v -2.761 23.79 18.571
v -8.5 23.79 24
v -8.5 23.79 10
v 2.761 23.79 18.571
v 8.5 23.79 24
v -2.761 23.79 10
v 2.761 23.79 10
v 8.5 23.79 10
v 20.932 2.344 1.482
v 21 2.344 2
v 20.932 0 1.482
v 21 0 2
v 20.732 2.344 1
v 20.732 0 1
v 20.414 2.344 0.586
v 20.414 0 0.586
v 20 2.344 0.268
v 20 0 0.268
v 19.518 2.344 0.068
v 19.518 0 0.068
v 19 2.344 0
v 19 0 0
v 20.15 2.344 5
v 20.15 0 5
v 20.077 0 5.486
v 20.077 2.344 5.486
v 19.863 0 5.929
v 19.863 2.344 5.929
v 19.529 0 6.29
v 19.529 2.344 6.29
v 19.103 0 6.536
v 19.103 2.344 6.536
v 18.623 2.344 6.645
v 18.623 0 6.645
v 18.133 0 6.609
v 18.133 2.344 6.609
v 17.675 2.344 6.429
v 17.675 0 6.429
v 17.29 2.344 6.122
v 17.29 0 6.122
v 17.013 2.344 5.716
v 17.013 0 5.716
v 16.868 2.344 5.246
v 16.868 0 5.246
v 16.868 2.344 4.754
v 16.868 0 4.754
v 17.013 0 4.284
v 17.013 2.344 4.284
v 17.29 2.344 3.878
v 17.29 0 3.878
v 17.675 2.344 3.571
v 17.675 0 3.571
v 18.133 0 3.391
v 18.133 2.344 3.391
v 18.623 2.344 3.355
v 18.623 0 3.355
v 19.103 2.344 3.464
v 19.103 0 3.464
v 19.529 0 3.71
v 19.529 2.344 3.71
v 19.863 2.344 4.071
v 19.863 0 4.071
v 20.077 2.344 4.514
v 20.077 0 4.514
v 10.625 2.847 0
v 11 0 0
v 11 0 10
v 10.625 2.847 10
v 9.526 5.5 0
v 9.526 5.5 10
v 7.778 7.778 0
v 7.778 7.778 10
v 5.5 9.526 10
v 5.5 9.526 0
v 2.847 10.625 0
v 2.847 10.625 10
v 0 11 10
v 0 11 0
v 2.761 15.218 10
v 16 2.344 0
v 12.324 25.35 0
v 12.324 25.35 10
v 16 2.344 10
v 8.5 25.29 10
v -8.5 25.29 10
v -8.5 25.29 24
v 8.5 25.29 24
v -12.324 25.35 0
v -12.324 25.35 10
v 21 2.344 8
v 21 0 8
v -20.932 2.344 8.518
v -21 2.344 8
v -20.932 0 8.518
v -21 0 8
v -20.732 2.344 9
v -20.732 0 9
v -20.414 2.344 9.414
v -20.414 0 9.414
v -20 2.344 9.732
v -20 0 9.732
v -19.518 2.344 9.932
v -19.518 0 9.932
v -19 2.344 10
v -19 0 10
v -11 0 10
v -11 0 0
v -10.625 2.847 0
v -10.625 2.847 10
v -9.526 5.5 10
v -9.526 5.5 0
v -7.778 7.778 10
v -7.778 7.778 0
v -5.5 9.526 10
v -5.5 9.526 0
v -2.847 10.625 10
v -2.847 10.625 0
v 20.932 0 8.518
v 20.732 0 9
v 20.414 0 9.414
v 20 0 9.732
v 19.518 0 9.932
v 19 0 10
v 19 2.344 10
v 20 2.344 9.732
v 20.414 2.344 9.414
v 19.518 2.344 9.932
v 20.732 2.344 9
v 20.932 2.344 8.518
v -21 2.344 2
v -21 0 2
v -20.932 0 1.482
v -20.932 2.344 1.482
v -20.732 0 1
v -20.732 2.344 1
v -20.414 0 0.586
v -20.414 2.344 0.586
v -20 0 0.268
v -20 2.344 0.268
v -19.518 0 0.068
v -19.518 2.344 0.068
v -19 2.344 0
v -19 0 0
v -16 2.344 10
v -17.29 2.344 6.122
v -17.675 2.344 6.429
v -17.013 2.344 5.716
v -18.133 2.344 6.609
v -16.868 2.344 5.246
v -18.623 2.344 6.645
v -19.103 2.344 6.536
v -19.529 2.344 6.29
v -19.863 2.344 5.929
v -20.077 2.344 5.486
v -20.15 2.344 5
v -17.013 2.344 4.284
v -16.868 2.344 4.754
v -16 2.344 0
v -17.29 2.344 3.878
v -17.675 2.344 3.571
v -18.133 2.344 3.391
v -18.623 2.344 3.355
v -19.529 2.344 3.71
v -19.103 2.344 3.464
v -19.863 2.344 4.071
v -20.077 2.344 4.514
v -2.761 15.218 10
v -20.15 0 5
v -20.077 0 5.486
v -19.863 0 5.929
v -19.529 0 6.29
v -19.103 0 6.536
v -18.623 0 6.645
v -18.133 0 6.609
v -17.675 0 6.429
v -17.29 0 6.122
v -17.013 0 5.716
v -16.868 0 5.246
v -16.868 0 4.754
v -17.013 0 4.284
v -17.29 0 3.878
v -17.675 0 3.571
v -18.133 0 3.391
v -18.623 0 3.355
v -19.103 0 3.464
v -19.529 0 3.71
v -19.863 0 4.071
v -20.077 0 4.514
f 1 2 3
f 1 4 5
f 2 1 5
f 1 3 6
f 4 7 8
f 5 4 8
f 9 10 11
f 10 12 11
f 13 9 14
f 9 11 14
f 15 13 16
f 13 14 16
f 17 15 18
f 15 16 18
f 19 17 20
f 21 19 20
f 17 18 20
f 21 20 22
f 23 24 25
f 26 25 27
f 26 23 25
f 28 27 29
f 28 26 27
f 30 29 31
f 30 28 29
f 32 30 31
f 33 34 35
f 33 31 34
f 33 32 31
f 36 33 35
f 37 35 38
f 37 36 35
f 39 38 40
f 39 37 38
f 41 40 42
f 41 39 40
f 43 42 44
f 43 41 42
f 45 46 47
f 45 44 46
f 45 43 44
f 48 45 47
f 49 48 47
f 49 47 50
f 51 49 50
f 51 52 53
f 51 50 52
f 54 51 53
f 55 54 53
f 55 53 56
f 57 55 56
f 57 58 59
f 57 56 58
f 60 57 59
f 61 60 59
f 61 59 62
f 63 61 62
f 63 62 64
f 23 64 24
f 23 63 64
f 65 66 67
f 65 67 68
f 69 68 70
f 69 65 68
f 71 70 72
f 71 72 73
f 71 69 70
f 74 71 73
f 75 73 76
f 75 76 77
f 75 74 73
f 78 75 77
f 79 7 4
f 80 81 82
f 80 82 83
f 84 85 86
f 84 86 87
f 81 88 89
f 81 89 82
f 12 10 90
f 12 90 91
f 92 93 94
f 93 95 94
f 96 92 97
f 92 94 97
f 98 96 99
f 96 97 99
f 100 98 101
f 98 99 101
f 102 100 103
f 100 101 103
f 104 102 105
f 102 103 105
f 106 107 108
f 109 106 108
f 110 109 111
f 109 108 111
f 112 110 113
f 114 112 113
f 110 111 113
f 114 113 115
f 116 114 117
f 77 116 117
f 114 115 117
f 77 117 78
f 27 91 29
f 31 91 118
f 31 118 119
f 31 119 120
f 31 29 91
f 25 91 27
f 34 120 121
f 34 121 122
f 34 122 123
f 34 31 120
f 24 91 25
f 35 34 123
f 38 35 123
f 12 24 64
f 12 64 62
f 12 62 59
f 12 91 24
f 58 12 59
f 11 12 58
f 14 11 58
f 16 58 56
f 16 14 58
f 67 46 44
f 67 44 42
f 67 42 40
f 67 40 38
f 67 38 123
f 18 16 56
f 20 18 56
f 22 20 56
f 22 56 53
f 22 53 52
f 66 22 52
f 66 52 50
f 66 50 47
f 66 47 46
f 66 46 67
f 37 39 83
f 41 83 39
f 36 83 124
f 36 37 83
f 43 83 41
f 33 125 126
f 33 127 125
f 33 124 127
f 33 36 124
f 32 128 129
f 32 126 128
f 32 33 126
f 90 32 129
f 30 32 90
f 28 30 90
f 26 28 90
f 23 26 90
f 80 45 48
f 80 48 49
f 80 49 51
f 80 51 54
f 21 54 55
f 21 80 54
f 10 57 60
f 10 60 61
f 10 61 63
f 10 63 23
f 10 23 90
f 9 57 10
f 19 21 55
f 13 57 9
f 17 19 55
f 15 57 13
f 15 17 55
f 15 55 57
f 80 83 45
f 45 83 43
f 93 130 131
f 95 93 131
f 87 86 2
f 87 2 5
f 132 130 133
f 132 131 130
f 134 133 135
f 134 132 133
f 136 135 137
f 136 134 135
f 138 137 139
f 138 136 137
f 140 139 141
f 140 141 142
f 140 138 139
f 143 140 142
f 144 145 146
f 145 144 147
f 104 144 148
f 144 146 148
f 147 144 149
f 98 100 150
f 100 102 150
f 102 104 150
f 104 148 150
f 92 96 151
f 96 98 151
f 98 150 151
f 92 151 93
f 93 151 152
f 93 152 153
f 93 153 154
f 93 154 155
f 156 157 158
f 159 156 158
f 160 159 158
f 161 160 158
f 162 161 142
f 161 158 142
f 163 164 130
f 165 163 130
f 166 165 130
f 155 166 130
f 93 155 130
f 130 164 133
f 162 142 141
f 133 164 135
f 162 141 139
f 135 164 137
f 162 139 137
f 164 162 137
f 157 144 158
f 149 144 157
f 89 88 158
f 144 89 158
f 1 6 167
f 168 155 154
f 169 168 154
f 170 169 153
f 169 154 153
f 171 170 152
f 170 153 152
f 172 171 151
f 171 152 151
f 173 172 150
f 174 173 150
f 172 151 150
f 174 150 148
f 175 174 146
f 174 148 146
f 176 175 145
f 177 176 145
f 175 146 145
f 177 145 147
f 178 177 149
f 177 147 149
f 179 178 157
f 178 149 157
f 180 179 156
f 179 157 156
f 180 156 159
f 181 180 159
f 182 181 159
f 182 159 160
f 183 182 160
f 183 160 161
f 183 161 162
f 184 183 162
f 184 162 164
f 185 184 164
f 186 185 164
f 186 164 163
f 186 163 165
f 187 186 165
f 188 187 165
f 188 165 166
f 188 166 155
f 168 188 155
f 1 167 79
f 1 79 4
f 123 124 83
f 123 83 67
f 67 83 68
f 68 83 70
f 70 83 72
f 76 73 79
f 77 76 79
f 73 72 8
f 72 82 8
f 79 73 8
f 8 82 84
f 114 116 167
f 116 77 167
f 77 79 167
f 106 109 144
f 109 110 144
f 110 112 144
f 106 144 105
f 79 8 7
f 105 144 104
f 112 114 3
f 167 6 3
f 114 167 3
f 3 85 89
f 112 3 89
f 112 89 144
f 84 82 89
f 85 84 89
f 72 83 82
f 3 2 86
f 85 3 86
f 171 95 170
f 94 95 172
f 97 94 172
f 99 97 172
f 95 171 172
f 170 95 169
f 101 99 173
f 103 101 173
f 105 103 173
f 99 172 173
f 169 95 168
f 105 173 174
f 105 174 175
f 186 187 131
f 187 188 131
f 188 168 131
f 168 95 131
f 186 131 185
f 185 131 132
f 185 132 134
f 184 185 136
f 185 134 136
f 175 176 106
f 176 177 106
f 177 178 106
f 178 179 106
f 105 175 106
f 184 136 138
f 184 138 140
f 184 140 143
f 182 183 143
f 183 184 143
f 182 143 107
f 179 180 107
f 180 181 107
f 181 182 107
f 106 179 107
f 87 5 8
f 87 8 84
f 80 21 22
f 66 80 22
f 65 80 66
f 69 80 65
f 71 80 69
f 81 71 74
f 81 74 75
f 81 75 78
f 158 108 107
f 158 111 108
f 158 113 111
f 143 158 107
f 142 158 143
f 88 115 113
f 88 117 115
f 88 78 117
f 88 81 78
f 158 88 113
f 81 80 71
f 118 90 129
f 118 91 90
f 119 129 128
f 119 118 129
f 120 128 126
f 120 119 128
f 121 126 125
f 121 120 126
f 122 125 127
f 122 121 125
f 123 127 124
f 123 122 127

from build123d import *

# Parameters (mm, degrees)
BOSS_EXTRUDE1_DEPTH  = 10
SKETCH2_R            = 1.65
EXTERNAL_HOLES_DEPTH = 10
FILLET1_R            = 2
FILLET1_OF_MIRROR1_R = 2
SKETCH4_W            = 17
SKETCH4_H            = 1.5
BOSS_EXTRUDE2_DEPTH  = 14
SKETCH5_W            = 5.521728368
SKETCH5_H            = 8.571266928
BOSS_EXTRUDE3_DEPTH  = 10
CHAMFER1_SIZE        = 10


with BuildPart() as part:
    # Sketch1 → Boss-Extrude1 (new body)
    with BuildSketch(Plane.XY):
        with BuildLine():
            Line((-21, 0), (-11, 0))
            ThreePointArc((-11, 0), (-7.778174593, 7.778174593), (0, 11))
            Line((0, 11), (0, 16.170747429))
            Line((0, 16.170747429), (0, 25.35025486))
            Line((0, 25.35025486), (-12.324468849, 25.35025486))
            Line((-12.324468849, 25.35025486), (-16, 2.343730447))
            Line((-16, 2.343730447), (-21, 2.343730447))
            Line((-21, 2.343730447), (-21, 0))
        make_face()
    boss_extrude1 = extrude(amount=BOSS_EXTRUDE1_DEPTH)

    # Sketch2 → External_holes (cut)
    with BuildSketch(Plane(origin=(0, 2.343730447, 0), x_dir=(1, 0, 0), z_dir=(0, 1, 0))):
        with Locations(Location((-18.5, -5, 0), (0, 0, 180))):
            Circle(SKETCH2_R)
    external_holes = extrude(amount=-EXTERNAL_HOLES_DEPTH, mode=Mode.SUBTRACT)

    # Fillet1
    fillet1_edges = [part.edges().sort_by_distance(p)[0] for p in [
        (-21, 1.171865223, 10),
        (-21, 1.171865223, 0),
    ]]
    fillet(fillet1_edges, radius=FILLET1_R)

    # Mirror1: Boss-Extrude1, External_holes across Right Plane
    add(boss_extrude1.mirror(Plane(origin=(0, 0, 0), x_dir=(0, 0, -1), z_dir=(1, 0, 0))))
    add(external_holes.mirror(Plane(origin=(0, 0, 0), x_dir=(0, 0, -1), z_dir=(1, 0, 0))), mode=Mode.SUBTRACT)

    # Fillet1 of Mirror1
    fillet1_of_mirror1_edges = [part.edges().sort_by_distance(p)[0] for p in [
        (21, 1.171865223, 10),
        (21, 1.171865223, 0),
    ]]
    fillet(fillet1_of_mirror1_edges, radius=FILLET1_OF_MIRROR1_R)

    # Sketch4 → Boss-Extrude2 (add)
    with BuildSketch(Plane.XY.offset(10)):
        with Locations((0, 24.539717426)):
            Rectangle(SKETCH4_W, SKETCH4_H)
    extrude(amount=BOSS_EXTRUDE2_DEPTH)

    # Sketch5 → Boss-Extrude3 (add)
    with BuildSketch(Plane.XZ.offset(-23.789717426)):
        with Locations((0, 14.285633464)):
            Rectangle(SKETCH5_W, SKETCH5_H)
    extrude(amount=BOSS_EXTRUDE3_DEPTH)

    # Chamfer1
    # the kernel refuses this chamfer: 10 mm, written as the material it takes off along each edge
    with BuildSketch(Plane(origin=(-28.477694064, 13.789717426, 18.571266928), x_dir=(0, -0.027495876610586317, -0.9996219169112968), z_dir=(1, 0, 0))) as chamfer1_piece_1_section:
        Polygon((CHAMFER1_SIZE * 0.999621916911, CHAMFER1_SIZE * 0.0274958766106), (-CHAMFER1_SIZE * 0.0274958766106, CHAMFER1_SIZE * 0.999621916911), (0, 0), align=None)
    chamfer1_piece_1 = extrude(amount=56.955388128, mode=Mode.PRIVATE)
    chamfer1_piece_1 = split(chamfer1_piece_1, bisect_by=Plane(origin=(0, 17.174320664, 10), z_dir=(0, 0, 1)), keep=Keep.TOP, mode=Mode.PRIVATE)
    chamfer1_piece_1 = split(chamfer1_piece_1, bisect_by=Plane(origin=(0, 23.789717426, 15.454914499), z_dir=(0, -1, 0)), keep=Keep.TOP, mode=Mode.PRIVATE)
    add(chamfer1_piece_1, mode=Mode.SUBTRACT)


solid = part.part
